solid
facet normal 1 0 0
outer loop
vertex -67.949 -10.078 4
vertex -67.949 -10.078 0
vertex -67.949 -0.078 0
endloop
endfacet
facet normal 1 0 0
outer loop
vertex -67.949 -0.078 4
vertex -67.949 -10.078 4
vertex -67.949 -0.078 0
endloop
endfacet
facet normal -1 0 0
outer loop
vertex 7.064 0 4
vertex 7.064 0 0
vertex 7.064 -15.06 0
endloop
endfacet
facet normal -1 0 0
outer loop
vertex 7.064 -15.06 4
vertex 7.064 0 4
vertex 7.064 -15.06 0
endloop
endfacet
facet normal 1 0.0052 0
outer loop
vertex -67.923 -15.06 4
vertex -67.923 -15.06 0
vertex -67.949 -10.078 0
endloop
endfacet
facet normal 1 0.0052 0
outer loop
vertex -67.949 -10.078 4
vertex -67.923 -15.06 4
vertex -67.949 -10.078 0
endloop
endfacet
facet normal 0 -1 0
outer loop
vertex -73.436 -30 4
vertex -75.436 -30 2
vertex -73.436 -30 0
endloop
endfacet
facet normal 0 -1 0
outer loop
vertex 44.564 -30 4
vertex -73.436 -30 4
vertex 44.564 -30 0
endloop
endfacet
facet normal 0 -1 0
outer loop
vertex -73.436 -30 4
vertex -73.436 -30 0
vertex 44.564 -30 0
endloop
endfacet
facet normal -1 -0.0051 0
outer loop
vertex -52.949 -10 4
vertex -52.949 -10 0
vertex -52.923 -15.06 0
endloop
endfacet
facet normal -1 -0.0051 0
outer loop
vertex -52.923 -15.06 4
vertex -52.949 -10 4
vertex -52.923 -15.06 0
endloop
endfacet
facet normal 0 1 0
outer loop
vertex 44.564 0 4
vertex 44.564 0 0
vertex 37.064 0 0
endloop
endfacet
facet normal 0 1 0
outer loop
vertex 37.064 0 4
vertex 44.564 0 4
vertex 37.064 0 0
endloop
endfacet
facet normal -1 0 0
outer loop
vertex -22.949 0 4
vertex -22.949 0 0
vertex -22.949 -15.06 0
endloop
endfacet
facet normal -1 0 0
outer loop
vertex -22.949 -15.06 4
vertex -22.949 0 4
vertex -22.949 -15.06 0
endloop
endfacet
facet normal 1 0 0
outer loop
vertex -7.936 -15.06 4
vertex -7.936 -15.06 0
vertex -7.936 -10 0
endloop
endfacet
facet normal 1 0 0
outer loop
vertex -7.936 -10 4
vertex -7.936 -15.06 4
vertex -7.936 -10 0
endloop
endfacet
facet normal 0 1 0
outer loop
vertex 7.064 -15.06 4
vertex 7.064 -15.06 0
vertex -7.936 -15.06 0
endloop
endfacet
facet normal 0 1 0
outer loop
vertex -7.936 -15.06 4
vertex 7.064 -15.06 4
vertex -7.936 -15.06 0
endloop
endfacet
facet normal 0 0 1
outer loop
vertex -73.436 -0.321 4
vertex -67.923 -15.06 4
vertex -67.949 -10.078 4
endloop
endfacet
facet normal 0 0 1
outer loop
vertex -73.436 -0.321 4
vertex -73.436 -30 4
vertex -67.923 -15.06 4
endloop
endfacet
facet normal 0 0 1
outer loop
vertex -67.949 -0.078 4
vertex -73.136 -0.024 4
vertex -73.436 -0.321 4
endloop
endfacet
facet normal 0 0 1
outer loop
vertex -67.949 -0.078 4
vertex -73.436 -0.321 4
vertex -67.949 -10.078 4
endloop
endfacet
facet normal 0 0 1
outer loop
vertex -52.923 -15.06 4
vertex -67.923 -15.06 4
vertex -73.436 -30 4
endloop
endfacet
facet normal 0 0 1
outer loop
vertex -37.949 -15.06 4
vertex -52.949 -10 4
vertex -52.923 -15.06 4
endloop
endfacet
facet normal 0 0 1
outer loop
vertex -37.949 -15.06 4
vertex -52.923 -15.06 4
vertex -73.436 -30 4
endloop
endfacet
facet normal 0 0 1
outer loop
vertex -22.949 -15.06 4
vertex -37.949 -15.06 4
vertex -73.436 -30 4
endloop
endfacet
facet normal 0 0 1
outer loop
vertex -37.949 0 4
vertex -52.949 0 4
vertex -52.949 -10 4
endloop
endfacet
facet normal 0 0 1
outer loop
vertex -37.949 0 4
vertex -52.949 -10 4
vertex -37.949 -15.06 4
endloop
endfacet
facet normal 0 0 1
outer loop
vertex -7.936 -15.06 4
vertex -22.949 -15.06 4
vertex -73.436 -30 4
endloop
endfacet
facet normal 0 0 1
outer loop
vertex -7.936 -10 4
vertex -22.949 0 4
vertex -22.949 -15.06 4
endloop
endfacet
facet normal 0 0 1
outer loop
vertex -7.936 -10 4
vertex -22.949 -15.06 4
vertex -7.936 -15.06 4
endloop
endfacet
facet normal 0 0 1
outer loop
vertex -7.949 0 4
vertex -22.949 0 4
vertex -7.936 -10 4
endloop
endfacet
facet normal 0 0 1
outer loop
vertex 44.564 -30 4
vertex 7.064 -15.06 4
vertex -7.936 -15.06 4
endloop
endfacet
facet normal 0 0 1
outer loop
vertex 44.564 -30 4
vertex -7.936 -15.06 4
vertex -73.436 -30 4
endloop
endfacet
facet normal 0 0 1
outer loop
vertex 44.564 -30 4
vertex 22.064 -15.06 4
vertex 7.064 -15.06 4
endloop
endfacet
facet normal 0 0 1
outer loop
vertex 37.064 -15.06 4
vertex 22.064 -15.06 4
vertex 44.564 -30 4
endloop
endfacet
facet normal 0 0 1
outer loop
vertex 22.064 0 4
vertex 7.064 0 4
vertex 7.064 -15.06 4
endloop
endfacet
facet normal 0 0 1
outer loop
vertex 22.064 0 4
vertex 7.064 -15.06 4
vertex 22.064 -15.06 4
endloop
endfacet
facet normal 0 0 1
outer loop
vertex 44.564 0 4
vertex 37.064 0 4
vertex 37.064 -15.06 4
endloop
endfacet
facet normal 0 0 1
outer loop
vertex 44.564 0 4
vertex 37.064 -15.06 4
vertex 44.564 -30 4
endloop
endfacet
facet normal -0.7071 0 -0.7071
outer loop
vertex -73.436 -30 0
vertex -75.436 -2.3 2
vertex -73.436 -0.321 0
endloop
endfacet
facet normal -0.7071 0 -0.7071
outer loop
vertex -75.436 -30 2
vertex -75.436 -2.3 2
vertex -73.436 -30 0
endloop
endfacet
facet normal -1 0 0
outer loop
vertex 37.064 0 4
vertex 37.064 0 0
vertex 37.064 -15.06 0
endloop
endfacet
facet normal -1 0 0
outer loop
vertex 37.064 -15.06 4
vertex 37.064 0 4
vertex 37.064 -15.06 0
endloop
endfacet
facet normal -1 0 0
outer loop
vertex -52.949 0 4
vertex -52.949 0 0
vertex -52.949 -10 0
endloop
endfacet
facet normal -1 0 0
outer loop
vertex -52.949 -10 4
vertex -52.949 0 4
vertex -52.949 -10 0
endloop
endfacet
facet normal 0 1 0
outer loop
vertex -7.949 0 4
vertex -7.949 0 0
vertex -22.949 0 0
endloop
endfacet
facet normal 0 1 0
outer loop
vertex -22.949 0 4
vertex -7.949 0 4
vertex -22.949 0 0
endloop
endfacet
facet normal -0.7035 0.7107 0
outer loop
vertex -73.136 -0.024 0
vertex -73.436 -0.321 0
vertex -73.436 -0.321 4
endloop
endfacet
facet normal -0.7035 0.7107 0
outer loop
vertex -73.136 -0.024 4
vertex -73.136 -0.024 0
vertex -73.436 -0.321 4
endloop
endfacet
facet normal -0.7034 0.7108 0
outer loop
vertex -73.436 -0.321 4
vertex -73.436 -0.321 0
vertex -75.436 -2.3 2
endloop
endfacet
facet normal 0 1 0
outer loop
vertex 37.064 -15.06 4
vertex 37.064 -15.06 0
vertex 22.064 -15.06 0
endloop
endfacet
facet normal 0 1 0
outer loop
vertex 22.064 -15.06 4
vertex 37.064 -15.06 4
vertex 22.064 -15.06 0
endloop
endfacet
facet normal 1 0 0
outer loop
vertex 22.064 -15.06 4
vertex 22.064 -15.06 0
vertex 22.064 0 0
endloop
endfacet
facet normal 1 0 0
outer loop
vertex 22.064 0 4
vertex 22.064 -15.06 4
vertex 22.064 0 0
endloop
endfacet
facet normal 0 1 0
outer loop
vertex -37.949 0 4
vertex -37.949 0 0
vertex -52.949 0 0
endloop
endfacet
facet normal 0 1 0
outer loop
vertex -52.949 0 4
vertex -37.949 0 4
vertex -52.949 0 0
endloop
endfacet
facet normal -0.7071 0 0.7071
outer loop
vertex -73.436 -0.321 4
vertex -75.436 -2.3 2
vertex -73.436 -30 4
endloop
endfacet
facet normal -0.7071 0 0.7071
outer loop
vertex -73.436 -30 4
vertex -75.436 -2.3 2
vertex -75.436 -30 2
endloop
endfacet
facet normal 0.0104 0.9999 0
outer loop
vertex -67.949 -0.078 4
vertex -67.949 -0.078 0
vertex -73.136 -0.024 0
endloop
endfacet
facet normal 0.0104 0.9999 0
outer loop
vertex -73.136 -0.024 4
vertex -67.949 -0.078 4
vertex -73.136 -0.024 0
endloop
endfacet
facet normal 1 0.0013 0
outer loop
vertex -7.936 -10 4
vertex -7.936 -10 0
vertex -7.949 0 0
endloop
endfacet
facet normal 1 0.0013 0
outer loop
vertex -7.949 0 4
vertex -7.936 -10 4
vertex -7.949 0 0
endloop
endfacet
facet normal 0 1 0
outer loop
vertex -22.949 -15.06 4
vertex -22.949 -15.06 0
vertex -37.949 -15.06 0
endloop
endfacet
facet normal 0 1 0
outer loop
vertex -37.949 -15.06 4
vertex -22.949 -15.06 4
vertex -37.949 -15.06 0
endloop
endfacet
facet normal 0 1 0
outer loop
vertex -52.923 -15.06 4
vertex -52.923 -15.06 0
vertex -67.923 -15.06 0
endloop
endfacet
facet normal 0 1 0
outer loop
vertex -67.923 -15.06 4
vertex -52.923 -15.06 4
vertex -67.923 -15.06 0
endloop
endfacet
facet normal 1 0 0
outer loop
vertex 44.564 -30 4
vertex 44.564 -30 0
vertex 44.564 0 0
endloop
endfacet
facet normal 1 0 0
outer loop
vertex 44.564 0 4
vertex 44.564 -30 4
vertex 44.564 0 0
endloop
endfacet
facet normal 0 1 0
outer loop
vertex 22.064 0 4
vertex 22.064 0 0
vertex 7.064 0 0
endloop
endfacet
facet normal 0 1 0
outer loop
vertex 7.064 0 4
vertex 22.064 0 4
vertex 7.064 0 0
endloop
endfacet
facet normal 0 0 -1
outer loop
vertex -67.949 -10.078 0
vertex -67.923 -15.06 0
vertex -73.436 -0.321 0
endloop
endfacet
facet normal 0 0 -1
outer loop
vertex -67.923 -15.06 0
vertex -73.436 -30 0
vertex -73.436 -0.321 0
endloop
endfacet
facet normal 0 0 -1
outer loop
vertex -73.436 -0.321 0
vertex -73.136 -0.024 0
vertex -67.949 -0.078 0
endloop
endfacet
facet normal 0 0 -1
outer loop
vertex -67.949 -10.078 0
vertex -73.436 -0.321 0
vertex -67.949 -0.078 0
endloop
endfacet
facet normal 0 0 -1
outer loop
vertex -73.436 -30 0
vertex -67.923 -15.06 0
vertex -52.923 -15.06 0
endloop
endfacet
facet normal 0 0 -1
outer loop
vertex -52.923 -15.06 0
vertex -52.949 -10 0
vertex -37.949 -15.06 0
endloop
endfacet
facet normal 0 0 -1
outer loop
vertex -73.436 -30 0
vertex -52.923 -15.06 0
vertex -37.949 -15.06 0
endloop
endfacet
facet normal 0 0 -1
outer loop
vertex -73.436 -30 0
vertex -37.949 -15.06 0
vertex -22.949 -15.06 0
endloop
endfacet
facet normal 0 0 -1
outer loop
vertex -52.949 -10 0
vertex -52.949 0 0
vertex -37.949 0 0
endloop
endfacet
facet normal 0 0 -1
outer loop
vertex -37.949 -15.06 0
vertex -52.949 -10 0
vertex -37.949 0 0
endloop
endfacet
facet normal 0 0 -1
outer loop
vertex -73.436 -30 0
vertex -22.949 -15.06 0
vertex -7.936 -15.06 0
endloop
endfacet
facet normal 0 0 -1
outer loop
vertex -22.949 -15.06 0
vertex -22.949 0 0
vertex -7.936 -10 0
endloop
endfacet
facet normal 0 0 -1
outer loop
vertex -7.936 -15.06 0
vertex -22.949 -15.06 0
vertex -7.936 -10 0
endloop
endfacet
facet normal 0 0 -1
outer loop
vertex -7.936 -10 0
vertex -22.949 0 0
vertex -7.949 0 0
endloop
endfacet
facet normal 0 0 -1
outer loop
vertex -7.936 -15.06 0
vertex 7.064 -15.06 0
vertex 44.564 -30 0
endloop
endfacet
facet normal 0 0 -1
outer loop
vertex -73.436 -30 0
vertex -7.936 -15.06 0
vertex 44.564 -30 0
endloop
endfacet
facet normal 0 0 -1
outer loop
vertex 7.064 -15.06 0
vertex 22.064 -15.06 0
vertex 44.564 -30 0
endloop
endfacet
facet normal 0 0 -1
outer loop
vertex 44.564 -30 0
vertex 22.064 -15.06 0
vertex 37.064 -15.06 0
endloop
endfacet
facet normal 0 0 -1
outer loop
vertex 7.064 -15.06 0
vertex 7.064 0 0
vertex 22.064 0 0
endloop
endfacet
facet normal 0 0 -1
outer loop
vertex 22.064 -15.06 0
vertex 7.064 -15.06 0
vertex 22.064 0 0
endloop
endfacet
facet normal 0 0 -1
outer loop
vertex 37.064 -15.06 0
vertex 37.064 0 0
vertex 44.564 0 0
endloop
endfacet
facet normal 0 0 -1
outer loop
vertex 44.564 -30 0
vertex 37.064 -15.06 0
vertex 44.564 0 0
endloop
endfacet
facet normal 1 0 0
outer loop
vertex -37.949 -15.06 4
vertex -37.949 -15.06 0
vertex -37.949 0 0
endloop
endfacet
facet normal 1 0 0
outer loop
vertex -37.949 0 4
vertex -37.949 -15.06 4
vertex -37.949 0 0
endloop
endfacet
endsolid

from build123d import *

# Parameters (mm, degrees)
F1_DEPTH = 4
F2_SIZE  = 2.3
F3_SIZE  = 1.99999


# Not quite as in the source:
# - a fillet or chamfer is up to 0.001 mm smaller than in the source, because OpenCascade refuses the exact size


with BuildPart() as f1:
    # F0 (on Top) → F1 (new body)
    with BuildSketch(Plane.XY):
        Polygon((-75.4356830697, -28.6679565907), (-75.4356830697, -30), (44.5643169303, -30), (44.5643169303, 0), (37.0643169303, 0), (37.0643169303, -10), (37.0643169303, -15.06), (22.0643169303, -15.06), (22.0643169303, -10), (22.0643169303, 0), (7.0643169303, 0), (7.0643169303, -10), (7.0643169303, -15.06), (-7.9356830697, -15.06), (-7.9356830697, -10), (-7.9491234598, 0), (-22.9491234598, 0), (-22.9491234598, -10), (-22.9491234598, -15.06), (-37.9491234598, -15.06), (-37.9491234598, -10), (-37.9491234598, 0), (-52.9491234598, 0), (-52.9491234598, -10), (-52.9229563225, -15.06), (-67.9233574687, -15.06), (-67.9491234598, -10.077570565), (-67.9491234598, -0.077570565), (-75.4356830697, 0), (-75.4356830697, -15.06), align=None)
    extrude(amount=F1_DEPTH)

    # F2
    f2_edges = [f1.edges().sort_by_distance(p)[0] for p in [
        (-75.435683, 0, 2),
    ]]
    chamfer(f2_edges, length=F2_SIZE)

    # F3 (size 2 in the source; OpenCascade refuses exactly that, so slightly less here)
    f3_edges = [f1.edges().sort_by_distance(p)[0] for p in [
        (-75.435683, -16.15, 0),
        (-75.435683, -16.15, 4),
    ]]
    chamfer(f3_edges, length=F3_SIZE)


solid = f1.part
